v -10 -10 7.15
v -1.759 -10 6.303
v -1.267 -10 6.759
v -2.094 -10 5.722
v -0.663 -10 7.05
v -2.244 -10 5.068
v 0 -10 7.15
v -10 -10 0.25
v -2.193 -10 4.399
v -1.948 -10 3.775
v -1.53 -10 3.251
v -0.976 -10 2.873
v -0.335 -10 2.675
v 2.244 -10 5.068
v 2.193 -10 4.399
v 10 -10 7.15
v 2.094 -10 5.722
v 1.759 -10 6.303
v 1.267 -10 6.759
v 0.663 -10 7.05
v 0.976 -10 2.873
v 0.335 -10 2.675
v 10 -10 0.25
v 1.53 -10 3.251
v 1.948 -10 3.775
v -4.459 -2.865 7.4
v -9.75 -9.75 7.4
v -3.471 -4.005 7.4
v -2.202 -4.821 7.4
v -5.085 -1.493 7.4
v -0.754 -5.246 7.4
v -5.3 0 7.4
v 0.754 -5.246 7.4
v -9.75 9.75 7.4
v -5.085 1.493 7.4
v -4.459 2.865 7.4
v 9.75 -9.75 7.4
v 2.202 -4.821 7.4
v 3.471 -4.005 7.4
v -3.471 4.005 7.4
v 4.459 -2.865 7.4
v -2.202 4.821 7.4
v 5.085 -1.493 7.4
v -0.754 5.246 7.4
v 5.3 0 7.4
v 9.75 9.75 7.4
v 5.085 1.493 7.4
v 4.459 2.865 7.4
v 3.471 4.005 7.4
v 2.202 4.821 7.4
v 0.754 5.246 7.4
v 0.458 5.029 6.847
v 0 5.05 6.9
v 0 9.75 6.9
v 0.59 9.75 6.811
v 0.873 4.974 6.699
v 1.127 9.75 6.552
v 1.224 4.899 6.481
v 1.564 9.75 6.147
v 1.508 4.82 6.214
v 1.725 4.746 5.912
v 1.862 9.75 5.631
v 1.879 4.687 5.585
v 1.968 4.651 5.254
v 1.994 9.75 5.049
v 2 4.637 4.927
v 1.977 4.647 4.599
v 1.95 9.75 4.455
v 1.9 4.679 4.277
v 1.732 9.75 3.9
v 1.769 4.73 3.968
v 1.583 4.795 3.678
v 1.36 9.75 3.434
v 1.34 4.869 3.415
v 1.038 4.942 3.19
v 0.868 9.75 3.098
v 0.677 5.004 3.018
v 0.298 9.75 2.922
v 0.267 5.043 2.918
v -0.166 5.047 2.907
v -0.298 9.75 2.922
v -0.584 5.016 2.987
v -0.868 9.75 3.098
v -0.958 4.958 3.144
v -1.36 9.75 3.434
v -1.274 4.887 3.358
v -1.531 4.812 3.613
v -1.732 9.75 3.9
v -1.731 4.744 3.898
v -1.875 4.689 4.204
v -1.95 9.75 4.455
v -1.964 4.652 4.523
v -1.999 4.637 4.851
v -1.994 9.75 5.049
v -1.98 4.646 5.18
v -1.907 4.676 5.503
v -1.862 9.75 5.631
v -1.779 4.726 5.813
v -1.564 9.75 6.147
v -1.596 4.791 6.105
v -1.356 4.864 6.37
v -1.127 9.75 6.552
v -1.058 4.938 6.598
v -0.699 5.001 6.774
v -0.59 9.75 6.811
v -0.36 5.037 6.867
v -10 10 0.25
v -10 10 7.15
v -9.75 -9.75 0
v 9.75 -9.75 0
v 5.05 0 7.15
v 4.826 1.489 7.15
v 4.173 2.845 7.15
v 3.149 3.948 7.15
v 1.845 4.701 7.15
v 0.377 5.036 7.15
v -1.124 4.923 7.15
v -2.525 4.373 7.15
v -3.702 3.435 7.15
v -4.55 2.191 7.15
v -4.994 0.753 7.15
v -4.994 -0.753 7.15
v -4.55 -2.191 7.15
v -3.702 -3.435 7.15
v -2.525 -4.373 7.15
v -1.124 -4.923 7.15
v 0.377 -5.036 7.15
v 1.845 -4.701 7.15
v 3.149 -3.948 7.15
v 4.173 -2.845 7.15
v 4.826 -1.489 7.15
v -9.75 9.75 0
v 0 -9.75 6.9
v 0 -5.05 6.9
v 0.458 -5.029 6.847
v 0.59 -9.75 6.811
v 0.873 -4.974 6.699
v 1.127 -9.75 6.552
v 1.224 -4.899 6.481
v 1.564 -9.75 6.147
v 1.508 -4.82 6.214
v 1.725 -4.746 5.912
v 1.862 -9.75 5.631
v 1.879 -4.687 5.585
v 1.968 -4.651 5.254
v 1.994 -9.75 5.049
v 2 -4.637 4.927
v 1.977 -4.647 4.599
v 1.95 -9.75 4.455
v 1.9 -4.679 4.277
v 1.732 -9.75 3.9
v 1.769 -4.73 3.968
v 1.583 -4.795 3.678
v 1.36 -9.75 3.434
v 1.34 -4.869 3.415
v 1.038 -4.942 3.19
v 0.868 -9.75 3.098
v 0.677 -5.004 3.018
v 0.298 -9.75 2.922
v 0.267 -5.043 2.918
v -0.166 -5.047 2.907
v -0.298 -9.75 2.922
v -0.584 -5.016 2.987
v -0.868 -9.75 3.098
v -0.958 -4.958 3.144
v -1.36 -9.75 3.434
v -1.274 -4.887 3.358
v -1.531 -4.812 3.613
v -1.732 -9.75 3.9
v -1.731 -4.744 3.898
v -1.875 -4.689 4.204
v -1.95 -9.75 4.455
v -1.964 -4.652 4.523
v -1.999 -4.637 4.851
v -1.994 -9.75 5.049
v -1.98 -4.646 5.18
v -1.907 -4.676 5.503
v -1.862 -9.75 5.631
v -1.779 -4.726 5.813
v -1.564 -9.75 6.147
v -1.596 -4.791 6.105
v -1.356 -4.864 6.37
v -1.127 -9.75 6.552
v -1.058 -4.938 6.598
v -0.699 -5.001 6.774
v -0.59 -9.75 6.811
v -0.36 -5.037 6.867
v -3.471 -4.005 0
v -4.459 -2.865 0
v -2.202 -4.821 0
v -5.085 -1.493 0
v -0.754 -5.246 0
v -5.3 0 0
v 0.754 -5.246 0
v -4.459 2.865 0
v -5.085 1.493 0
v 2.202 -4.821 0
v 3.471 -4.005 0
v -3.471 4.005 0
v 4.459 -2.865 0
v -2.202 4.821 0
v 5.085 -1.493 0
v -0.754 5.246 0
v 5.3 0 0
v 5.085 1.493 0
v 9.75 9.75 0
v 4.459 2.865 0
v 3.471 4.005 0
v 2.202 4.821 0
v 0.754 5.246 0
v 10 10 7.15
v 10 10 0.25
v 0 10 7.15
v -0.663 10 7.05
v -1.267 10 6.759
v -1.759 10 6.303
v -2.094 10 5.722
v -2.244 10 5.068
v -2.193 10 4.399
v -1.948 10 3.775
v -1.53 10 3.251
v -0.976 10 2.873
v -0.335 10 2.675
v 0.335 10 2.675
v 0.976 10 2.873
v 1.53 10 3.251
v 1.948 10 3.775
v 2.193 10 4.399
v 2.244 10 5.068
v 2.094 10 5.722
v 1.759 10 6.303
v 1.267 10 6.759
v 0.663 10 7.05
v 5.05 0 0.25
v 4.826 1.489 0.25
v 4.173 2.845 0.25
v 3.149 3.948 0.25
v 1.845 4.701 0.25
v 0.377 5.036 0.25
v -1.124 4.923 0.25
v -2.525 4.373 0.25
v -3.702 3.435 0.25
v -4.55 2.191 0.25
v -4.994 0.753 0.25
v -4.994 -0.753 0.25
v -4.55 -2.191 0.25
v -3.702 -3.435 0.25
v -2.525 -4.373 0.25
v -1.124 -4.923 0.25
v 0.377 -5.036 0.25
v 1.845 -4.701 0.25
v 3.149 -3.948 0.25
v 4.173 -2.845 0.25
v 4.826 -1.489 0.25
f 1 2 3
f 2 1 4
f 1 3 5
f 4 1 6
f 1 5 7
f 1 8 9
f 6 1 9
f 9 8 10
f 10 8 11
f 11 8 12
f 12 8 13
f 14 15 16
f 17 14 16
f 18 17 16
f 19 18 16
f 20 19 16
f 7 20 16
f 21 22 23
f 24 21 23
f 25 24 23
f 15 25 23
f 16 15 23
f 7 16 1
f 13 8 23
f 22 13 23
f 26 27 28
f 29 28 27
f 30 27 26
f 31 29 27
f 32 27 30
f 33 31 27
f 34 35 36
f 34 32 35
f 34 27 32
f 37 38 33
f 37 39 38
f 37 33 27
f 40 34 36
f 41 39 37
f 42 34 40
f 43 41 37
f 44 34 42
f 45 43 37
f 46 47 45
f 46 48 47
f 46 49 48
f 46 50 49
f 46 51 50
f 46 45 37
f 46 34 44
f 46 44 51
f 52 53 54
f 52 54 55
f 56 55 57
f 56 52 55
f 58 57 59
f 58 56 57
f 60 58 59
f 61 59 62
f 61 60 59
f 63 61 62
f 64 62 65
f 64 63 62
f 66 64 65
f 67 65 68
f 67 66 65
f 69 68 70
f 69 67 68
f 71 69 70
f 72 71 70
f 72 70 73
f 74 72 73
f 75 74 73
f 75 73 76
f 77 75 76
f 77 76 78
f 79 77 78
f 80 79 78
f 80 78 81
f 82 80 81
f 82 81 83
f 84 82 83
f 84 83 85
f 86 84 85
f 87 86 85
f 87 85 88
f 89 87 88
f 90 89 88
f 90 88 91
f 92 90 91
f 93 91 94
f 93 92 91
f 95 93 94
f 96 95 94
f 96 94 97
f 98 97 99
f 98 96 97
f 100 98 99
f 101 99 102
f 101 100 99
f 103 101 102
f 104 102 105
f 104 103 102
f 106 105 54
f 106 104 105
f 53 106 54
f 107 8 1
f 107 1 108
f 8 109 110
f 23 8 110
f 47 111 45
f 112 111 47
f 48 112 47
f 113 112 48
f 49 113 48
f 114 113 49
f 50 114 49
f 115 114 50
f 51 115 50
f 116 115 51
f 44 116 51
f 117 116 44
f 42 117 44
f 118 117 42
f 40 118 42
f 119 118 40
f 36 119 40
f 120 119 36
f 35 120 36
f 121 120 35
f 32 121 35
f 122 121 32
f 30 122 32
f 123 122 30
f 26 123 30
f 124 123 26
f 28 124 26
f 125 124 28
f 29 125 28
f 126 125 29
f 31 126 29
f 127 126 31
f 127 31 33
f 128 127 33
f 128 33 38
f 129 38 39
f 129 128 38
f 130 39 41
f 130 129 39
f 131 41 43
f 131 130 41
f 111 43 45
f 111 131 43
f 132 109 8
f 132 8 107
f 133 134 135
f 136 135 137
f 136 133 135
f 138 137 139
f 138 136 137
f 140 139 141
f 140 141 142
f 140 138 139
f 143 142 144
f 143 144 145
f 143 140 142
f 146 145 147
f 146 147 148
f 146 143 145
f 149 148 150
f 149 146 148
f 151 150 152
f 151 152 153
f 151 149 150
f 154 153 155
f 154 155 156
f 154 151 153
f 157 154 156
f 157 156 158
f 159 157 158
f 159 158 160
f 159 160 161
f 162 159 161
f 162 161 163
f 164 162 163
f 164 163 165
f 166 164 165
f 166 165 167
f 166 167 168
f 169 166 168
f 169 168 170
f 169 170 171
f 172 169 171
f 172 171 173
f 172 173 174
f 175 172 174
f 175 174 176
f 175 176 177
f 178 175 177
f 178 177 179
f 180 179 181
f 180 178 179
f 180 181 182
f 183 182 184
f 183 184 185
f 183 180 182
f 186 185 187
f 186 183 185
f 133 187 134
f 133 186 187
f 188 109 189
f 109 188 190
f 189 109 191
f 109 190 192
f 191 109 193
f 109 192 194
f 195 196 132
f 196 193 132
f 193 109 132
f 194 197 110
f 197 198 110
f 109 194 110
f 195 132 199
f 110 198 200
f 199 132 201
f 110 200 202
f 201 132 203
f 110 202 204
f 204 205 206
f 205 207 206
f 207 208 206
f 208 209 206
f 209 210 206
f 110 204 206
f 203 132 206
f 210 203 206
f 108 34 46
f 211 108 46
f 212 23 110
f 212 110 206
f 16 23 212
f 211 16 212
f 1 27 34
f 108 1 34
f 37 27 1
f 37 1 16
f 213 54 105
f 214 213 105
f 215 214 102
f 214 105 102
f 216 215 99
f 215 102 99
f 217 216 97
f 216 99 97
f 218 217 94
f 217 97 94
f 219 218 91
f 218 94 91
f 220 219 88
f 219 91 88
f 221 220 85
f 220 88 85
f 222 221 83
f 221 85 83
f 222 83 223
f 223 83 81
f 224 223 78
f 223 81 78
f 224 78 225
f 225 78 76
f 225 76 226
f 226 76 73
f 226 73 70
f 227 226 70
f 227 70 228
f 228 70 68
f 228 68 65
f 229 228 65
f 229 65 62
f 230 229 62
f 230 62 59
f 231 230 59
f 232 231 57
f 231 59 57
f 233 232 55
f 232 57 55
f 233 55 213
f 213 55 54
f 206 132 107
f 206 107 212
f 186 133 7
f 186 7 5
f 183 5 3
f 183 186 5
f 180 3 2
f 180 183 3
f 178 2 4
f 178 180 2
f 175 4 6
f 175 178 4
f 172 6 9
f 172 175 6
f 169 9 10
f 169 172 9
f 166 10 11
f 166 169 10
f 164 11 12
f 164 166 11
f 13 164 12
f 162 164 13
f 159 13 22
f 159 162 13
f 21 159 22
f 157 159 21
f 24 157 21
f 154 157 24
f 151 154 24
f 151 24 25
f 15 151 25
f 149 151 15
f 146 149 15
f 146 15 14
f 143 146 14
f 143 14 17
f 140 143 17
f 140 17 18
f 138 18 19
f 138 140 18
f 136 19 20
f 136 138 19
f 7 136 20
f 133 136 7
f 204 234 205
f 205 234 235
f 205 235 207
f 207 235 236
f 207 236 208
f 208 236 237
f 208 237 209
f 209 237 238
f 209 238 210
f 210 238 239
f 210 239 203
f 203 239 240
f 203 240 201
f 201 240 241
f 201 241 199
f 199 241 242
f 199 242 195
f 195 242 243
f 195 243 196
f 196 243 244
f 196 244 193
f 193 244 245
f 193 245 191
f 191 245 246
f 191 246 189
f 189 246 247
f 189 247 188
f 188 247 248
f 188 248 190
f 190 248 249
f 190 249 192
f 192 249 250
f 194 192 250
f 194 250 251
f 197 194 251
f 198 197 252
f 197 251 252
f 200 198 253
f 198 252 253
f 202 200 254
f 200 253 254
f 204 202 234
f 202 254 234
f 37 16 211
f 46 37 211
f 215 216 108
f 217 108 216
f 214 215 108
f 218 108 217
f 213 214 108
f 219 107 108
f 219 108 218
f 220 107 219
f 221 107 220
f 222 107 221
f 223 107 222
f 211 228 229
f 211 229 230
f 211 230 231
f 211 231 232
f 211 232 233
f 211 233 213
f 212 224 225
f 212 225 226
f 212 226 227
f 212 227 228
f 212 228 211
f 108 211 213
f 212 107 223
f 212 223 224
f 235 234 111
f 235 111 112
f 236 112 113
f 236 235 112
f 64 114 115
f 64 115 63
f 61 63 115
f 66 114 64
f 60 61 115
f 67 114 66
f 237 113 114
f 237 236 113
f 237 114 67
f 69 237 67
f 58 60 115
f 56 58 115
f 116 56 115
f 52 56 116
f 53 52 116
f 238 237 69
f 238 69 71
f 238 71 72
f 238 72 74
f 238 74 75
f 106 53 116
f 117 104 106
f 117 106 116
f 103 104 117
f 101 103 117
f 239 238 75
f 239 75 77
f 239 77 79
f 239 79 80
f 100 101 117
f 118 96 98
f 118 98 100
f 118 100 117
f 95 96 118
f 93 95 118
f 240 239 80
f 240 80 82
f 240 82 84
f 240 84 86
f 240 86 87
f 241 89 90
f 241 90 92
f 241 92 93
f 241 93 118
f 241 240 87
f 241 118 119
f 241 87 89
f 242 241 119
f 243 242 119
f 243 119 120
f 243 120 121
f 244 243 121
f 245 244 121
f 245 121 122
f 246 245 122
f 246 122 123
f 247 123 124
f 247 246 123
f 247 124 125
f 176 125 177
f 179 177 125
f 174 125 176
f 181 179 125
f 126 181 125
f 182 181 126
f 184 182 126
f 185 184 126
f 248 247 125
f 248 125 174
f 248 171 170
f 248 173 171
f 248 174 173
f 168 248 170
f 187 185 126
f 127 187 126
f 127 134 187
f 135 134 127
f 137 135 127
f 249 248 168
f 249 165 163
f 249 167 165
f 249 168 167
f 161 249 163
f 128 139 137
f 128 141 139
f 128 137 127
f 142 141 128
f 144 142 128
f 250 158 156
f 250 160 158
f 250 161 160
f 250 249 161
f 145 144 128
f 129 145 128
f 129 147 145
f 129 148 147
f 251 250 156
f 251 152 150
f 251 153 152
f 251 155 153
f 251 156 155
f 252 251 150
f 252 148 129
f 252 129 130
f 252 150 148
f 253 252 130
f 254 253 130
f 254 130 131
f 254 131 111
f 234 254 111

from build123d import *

# Parameters (mm, degrees)
SKETCH1_W               = 20
SKETCH1_H               = 20
SKETCH1_R               = 5.05
BOSS_EXTRUDE1_DEPTH     = 7.4
CUT_EXTRUDE1_DEPTH      = 16.961202962
CUT_EXTRUDE1_DEPTH_BACK = 16.961202962
SKETCH2_R               = 2
CHAMFER1_SIZE           = 0.25


with BuildPart() as part:
    # Sketch1 → Boss-Extrude1 (new body)
    with BuildSketch(Plane.XY):
        Rectangle(SKETCH1_W, SKETCH1_H)
        Circle(SKETCH1_R, mode=Mode.SUBTRACT)
    extrude(amount=BOSS_EXTRUDE1_DEPTH)

    # Sketch2 → Cut-Extrude1 (cut, two sides: drawn at the far end of the back side and taken through both)
    with BuildSketch(Plane(origin=(0, 0, 0), x_dir=(1, 0, 0), z_dir=(0, 1, 0)).offset(-CUT_EXTRUDE1_DEPTH_BACK)):
        with Locations(Location((0, -4.9, 0), (0, 0, 270))):
            Circle(SKETCH2_R)
    extrude(amount=CUT_EXTRUDE1_DEPTH + CUT_EXTRUDE1_DEPTH_BACK, mode=Mode.SUBTRACT)

    # Chamfer1
    chamfer1_edges = [part.edges().sort_by_distance(p)[0] for p in [
        (-5.05, 0, 0),
        (-5.05, 0, 7.4),
        (-10, 0, 7.4),
        (0, -10, 7.4),
        (0, -10, 2.9),
        (0, 10, 2.9),
        (10, 0, 7.4),
        (0, -10, 0),
        (-10, 0, 0),
        (0, 10, 0),
        (10, 0, 0),
        (0, 10, 7.4),
    ]]
    chamfer(chamfer1_edges, length=CHAMFER1_SIZE - 0.0001)  # a hair under: the kernel refuses the full size


solid = part.part
